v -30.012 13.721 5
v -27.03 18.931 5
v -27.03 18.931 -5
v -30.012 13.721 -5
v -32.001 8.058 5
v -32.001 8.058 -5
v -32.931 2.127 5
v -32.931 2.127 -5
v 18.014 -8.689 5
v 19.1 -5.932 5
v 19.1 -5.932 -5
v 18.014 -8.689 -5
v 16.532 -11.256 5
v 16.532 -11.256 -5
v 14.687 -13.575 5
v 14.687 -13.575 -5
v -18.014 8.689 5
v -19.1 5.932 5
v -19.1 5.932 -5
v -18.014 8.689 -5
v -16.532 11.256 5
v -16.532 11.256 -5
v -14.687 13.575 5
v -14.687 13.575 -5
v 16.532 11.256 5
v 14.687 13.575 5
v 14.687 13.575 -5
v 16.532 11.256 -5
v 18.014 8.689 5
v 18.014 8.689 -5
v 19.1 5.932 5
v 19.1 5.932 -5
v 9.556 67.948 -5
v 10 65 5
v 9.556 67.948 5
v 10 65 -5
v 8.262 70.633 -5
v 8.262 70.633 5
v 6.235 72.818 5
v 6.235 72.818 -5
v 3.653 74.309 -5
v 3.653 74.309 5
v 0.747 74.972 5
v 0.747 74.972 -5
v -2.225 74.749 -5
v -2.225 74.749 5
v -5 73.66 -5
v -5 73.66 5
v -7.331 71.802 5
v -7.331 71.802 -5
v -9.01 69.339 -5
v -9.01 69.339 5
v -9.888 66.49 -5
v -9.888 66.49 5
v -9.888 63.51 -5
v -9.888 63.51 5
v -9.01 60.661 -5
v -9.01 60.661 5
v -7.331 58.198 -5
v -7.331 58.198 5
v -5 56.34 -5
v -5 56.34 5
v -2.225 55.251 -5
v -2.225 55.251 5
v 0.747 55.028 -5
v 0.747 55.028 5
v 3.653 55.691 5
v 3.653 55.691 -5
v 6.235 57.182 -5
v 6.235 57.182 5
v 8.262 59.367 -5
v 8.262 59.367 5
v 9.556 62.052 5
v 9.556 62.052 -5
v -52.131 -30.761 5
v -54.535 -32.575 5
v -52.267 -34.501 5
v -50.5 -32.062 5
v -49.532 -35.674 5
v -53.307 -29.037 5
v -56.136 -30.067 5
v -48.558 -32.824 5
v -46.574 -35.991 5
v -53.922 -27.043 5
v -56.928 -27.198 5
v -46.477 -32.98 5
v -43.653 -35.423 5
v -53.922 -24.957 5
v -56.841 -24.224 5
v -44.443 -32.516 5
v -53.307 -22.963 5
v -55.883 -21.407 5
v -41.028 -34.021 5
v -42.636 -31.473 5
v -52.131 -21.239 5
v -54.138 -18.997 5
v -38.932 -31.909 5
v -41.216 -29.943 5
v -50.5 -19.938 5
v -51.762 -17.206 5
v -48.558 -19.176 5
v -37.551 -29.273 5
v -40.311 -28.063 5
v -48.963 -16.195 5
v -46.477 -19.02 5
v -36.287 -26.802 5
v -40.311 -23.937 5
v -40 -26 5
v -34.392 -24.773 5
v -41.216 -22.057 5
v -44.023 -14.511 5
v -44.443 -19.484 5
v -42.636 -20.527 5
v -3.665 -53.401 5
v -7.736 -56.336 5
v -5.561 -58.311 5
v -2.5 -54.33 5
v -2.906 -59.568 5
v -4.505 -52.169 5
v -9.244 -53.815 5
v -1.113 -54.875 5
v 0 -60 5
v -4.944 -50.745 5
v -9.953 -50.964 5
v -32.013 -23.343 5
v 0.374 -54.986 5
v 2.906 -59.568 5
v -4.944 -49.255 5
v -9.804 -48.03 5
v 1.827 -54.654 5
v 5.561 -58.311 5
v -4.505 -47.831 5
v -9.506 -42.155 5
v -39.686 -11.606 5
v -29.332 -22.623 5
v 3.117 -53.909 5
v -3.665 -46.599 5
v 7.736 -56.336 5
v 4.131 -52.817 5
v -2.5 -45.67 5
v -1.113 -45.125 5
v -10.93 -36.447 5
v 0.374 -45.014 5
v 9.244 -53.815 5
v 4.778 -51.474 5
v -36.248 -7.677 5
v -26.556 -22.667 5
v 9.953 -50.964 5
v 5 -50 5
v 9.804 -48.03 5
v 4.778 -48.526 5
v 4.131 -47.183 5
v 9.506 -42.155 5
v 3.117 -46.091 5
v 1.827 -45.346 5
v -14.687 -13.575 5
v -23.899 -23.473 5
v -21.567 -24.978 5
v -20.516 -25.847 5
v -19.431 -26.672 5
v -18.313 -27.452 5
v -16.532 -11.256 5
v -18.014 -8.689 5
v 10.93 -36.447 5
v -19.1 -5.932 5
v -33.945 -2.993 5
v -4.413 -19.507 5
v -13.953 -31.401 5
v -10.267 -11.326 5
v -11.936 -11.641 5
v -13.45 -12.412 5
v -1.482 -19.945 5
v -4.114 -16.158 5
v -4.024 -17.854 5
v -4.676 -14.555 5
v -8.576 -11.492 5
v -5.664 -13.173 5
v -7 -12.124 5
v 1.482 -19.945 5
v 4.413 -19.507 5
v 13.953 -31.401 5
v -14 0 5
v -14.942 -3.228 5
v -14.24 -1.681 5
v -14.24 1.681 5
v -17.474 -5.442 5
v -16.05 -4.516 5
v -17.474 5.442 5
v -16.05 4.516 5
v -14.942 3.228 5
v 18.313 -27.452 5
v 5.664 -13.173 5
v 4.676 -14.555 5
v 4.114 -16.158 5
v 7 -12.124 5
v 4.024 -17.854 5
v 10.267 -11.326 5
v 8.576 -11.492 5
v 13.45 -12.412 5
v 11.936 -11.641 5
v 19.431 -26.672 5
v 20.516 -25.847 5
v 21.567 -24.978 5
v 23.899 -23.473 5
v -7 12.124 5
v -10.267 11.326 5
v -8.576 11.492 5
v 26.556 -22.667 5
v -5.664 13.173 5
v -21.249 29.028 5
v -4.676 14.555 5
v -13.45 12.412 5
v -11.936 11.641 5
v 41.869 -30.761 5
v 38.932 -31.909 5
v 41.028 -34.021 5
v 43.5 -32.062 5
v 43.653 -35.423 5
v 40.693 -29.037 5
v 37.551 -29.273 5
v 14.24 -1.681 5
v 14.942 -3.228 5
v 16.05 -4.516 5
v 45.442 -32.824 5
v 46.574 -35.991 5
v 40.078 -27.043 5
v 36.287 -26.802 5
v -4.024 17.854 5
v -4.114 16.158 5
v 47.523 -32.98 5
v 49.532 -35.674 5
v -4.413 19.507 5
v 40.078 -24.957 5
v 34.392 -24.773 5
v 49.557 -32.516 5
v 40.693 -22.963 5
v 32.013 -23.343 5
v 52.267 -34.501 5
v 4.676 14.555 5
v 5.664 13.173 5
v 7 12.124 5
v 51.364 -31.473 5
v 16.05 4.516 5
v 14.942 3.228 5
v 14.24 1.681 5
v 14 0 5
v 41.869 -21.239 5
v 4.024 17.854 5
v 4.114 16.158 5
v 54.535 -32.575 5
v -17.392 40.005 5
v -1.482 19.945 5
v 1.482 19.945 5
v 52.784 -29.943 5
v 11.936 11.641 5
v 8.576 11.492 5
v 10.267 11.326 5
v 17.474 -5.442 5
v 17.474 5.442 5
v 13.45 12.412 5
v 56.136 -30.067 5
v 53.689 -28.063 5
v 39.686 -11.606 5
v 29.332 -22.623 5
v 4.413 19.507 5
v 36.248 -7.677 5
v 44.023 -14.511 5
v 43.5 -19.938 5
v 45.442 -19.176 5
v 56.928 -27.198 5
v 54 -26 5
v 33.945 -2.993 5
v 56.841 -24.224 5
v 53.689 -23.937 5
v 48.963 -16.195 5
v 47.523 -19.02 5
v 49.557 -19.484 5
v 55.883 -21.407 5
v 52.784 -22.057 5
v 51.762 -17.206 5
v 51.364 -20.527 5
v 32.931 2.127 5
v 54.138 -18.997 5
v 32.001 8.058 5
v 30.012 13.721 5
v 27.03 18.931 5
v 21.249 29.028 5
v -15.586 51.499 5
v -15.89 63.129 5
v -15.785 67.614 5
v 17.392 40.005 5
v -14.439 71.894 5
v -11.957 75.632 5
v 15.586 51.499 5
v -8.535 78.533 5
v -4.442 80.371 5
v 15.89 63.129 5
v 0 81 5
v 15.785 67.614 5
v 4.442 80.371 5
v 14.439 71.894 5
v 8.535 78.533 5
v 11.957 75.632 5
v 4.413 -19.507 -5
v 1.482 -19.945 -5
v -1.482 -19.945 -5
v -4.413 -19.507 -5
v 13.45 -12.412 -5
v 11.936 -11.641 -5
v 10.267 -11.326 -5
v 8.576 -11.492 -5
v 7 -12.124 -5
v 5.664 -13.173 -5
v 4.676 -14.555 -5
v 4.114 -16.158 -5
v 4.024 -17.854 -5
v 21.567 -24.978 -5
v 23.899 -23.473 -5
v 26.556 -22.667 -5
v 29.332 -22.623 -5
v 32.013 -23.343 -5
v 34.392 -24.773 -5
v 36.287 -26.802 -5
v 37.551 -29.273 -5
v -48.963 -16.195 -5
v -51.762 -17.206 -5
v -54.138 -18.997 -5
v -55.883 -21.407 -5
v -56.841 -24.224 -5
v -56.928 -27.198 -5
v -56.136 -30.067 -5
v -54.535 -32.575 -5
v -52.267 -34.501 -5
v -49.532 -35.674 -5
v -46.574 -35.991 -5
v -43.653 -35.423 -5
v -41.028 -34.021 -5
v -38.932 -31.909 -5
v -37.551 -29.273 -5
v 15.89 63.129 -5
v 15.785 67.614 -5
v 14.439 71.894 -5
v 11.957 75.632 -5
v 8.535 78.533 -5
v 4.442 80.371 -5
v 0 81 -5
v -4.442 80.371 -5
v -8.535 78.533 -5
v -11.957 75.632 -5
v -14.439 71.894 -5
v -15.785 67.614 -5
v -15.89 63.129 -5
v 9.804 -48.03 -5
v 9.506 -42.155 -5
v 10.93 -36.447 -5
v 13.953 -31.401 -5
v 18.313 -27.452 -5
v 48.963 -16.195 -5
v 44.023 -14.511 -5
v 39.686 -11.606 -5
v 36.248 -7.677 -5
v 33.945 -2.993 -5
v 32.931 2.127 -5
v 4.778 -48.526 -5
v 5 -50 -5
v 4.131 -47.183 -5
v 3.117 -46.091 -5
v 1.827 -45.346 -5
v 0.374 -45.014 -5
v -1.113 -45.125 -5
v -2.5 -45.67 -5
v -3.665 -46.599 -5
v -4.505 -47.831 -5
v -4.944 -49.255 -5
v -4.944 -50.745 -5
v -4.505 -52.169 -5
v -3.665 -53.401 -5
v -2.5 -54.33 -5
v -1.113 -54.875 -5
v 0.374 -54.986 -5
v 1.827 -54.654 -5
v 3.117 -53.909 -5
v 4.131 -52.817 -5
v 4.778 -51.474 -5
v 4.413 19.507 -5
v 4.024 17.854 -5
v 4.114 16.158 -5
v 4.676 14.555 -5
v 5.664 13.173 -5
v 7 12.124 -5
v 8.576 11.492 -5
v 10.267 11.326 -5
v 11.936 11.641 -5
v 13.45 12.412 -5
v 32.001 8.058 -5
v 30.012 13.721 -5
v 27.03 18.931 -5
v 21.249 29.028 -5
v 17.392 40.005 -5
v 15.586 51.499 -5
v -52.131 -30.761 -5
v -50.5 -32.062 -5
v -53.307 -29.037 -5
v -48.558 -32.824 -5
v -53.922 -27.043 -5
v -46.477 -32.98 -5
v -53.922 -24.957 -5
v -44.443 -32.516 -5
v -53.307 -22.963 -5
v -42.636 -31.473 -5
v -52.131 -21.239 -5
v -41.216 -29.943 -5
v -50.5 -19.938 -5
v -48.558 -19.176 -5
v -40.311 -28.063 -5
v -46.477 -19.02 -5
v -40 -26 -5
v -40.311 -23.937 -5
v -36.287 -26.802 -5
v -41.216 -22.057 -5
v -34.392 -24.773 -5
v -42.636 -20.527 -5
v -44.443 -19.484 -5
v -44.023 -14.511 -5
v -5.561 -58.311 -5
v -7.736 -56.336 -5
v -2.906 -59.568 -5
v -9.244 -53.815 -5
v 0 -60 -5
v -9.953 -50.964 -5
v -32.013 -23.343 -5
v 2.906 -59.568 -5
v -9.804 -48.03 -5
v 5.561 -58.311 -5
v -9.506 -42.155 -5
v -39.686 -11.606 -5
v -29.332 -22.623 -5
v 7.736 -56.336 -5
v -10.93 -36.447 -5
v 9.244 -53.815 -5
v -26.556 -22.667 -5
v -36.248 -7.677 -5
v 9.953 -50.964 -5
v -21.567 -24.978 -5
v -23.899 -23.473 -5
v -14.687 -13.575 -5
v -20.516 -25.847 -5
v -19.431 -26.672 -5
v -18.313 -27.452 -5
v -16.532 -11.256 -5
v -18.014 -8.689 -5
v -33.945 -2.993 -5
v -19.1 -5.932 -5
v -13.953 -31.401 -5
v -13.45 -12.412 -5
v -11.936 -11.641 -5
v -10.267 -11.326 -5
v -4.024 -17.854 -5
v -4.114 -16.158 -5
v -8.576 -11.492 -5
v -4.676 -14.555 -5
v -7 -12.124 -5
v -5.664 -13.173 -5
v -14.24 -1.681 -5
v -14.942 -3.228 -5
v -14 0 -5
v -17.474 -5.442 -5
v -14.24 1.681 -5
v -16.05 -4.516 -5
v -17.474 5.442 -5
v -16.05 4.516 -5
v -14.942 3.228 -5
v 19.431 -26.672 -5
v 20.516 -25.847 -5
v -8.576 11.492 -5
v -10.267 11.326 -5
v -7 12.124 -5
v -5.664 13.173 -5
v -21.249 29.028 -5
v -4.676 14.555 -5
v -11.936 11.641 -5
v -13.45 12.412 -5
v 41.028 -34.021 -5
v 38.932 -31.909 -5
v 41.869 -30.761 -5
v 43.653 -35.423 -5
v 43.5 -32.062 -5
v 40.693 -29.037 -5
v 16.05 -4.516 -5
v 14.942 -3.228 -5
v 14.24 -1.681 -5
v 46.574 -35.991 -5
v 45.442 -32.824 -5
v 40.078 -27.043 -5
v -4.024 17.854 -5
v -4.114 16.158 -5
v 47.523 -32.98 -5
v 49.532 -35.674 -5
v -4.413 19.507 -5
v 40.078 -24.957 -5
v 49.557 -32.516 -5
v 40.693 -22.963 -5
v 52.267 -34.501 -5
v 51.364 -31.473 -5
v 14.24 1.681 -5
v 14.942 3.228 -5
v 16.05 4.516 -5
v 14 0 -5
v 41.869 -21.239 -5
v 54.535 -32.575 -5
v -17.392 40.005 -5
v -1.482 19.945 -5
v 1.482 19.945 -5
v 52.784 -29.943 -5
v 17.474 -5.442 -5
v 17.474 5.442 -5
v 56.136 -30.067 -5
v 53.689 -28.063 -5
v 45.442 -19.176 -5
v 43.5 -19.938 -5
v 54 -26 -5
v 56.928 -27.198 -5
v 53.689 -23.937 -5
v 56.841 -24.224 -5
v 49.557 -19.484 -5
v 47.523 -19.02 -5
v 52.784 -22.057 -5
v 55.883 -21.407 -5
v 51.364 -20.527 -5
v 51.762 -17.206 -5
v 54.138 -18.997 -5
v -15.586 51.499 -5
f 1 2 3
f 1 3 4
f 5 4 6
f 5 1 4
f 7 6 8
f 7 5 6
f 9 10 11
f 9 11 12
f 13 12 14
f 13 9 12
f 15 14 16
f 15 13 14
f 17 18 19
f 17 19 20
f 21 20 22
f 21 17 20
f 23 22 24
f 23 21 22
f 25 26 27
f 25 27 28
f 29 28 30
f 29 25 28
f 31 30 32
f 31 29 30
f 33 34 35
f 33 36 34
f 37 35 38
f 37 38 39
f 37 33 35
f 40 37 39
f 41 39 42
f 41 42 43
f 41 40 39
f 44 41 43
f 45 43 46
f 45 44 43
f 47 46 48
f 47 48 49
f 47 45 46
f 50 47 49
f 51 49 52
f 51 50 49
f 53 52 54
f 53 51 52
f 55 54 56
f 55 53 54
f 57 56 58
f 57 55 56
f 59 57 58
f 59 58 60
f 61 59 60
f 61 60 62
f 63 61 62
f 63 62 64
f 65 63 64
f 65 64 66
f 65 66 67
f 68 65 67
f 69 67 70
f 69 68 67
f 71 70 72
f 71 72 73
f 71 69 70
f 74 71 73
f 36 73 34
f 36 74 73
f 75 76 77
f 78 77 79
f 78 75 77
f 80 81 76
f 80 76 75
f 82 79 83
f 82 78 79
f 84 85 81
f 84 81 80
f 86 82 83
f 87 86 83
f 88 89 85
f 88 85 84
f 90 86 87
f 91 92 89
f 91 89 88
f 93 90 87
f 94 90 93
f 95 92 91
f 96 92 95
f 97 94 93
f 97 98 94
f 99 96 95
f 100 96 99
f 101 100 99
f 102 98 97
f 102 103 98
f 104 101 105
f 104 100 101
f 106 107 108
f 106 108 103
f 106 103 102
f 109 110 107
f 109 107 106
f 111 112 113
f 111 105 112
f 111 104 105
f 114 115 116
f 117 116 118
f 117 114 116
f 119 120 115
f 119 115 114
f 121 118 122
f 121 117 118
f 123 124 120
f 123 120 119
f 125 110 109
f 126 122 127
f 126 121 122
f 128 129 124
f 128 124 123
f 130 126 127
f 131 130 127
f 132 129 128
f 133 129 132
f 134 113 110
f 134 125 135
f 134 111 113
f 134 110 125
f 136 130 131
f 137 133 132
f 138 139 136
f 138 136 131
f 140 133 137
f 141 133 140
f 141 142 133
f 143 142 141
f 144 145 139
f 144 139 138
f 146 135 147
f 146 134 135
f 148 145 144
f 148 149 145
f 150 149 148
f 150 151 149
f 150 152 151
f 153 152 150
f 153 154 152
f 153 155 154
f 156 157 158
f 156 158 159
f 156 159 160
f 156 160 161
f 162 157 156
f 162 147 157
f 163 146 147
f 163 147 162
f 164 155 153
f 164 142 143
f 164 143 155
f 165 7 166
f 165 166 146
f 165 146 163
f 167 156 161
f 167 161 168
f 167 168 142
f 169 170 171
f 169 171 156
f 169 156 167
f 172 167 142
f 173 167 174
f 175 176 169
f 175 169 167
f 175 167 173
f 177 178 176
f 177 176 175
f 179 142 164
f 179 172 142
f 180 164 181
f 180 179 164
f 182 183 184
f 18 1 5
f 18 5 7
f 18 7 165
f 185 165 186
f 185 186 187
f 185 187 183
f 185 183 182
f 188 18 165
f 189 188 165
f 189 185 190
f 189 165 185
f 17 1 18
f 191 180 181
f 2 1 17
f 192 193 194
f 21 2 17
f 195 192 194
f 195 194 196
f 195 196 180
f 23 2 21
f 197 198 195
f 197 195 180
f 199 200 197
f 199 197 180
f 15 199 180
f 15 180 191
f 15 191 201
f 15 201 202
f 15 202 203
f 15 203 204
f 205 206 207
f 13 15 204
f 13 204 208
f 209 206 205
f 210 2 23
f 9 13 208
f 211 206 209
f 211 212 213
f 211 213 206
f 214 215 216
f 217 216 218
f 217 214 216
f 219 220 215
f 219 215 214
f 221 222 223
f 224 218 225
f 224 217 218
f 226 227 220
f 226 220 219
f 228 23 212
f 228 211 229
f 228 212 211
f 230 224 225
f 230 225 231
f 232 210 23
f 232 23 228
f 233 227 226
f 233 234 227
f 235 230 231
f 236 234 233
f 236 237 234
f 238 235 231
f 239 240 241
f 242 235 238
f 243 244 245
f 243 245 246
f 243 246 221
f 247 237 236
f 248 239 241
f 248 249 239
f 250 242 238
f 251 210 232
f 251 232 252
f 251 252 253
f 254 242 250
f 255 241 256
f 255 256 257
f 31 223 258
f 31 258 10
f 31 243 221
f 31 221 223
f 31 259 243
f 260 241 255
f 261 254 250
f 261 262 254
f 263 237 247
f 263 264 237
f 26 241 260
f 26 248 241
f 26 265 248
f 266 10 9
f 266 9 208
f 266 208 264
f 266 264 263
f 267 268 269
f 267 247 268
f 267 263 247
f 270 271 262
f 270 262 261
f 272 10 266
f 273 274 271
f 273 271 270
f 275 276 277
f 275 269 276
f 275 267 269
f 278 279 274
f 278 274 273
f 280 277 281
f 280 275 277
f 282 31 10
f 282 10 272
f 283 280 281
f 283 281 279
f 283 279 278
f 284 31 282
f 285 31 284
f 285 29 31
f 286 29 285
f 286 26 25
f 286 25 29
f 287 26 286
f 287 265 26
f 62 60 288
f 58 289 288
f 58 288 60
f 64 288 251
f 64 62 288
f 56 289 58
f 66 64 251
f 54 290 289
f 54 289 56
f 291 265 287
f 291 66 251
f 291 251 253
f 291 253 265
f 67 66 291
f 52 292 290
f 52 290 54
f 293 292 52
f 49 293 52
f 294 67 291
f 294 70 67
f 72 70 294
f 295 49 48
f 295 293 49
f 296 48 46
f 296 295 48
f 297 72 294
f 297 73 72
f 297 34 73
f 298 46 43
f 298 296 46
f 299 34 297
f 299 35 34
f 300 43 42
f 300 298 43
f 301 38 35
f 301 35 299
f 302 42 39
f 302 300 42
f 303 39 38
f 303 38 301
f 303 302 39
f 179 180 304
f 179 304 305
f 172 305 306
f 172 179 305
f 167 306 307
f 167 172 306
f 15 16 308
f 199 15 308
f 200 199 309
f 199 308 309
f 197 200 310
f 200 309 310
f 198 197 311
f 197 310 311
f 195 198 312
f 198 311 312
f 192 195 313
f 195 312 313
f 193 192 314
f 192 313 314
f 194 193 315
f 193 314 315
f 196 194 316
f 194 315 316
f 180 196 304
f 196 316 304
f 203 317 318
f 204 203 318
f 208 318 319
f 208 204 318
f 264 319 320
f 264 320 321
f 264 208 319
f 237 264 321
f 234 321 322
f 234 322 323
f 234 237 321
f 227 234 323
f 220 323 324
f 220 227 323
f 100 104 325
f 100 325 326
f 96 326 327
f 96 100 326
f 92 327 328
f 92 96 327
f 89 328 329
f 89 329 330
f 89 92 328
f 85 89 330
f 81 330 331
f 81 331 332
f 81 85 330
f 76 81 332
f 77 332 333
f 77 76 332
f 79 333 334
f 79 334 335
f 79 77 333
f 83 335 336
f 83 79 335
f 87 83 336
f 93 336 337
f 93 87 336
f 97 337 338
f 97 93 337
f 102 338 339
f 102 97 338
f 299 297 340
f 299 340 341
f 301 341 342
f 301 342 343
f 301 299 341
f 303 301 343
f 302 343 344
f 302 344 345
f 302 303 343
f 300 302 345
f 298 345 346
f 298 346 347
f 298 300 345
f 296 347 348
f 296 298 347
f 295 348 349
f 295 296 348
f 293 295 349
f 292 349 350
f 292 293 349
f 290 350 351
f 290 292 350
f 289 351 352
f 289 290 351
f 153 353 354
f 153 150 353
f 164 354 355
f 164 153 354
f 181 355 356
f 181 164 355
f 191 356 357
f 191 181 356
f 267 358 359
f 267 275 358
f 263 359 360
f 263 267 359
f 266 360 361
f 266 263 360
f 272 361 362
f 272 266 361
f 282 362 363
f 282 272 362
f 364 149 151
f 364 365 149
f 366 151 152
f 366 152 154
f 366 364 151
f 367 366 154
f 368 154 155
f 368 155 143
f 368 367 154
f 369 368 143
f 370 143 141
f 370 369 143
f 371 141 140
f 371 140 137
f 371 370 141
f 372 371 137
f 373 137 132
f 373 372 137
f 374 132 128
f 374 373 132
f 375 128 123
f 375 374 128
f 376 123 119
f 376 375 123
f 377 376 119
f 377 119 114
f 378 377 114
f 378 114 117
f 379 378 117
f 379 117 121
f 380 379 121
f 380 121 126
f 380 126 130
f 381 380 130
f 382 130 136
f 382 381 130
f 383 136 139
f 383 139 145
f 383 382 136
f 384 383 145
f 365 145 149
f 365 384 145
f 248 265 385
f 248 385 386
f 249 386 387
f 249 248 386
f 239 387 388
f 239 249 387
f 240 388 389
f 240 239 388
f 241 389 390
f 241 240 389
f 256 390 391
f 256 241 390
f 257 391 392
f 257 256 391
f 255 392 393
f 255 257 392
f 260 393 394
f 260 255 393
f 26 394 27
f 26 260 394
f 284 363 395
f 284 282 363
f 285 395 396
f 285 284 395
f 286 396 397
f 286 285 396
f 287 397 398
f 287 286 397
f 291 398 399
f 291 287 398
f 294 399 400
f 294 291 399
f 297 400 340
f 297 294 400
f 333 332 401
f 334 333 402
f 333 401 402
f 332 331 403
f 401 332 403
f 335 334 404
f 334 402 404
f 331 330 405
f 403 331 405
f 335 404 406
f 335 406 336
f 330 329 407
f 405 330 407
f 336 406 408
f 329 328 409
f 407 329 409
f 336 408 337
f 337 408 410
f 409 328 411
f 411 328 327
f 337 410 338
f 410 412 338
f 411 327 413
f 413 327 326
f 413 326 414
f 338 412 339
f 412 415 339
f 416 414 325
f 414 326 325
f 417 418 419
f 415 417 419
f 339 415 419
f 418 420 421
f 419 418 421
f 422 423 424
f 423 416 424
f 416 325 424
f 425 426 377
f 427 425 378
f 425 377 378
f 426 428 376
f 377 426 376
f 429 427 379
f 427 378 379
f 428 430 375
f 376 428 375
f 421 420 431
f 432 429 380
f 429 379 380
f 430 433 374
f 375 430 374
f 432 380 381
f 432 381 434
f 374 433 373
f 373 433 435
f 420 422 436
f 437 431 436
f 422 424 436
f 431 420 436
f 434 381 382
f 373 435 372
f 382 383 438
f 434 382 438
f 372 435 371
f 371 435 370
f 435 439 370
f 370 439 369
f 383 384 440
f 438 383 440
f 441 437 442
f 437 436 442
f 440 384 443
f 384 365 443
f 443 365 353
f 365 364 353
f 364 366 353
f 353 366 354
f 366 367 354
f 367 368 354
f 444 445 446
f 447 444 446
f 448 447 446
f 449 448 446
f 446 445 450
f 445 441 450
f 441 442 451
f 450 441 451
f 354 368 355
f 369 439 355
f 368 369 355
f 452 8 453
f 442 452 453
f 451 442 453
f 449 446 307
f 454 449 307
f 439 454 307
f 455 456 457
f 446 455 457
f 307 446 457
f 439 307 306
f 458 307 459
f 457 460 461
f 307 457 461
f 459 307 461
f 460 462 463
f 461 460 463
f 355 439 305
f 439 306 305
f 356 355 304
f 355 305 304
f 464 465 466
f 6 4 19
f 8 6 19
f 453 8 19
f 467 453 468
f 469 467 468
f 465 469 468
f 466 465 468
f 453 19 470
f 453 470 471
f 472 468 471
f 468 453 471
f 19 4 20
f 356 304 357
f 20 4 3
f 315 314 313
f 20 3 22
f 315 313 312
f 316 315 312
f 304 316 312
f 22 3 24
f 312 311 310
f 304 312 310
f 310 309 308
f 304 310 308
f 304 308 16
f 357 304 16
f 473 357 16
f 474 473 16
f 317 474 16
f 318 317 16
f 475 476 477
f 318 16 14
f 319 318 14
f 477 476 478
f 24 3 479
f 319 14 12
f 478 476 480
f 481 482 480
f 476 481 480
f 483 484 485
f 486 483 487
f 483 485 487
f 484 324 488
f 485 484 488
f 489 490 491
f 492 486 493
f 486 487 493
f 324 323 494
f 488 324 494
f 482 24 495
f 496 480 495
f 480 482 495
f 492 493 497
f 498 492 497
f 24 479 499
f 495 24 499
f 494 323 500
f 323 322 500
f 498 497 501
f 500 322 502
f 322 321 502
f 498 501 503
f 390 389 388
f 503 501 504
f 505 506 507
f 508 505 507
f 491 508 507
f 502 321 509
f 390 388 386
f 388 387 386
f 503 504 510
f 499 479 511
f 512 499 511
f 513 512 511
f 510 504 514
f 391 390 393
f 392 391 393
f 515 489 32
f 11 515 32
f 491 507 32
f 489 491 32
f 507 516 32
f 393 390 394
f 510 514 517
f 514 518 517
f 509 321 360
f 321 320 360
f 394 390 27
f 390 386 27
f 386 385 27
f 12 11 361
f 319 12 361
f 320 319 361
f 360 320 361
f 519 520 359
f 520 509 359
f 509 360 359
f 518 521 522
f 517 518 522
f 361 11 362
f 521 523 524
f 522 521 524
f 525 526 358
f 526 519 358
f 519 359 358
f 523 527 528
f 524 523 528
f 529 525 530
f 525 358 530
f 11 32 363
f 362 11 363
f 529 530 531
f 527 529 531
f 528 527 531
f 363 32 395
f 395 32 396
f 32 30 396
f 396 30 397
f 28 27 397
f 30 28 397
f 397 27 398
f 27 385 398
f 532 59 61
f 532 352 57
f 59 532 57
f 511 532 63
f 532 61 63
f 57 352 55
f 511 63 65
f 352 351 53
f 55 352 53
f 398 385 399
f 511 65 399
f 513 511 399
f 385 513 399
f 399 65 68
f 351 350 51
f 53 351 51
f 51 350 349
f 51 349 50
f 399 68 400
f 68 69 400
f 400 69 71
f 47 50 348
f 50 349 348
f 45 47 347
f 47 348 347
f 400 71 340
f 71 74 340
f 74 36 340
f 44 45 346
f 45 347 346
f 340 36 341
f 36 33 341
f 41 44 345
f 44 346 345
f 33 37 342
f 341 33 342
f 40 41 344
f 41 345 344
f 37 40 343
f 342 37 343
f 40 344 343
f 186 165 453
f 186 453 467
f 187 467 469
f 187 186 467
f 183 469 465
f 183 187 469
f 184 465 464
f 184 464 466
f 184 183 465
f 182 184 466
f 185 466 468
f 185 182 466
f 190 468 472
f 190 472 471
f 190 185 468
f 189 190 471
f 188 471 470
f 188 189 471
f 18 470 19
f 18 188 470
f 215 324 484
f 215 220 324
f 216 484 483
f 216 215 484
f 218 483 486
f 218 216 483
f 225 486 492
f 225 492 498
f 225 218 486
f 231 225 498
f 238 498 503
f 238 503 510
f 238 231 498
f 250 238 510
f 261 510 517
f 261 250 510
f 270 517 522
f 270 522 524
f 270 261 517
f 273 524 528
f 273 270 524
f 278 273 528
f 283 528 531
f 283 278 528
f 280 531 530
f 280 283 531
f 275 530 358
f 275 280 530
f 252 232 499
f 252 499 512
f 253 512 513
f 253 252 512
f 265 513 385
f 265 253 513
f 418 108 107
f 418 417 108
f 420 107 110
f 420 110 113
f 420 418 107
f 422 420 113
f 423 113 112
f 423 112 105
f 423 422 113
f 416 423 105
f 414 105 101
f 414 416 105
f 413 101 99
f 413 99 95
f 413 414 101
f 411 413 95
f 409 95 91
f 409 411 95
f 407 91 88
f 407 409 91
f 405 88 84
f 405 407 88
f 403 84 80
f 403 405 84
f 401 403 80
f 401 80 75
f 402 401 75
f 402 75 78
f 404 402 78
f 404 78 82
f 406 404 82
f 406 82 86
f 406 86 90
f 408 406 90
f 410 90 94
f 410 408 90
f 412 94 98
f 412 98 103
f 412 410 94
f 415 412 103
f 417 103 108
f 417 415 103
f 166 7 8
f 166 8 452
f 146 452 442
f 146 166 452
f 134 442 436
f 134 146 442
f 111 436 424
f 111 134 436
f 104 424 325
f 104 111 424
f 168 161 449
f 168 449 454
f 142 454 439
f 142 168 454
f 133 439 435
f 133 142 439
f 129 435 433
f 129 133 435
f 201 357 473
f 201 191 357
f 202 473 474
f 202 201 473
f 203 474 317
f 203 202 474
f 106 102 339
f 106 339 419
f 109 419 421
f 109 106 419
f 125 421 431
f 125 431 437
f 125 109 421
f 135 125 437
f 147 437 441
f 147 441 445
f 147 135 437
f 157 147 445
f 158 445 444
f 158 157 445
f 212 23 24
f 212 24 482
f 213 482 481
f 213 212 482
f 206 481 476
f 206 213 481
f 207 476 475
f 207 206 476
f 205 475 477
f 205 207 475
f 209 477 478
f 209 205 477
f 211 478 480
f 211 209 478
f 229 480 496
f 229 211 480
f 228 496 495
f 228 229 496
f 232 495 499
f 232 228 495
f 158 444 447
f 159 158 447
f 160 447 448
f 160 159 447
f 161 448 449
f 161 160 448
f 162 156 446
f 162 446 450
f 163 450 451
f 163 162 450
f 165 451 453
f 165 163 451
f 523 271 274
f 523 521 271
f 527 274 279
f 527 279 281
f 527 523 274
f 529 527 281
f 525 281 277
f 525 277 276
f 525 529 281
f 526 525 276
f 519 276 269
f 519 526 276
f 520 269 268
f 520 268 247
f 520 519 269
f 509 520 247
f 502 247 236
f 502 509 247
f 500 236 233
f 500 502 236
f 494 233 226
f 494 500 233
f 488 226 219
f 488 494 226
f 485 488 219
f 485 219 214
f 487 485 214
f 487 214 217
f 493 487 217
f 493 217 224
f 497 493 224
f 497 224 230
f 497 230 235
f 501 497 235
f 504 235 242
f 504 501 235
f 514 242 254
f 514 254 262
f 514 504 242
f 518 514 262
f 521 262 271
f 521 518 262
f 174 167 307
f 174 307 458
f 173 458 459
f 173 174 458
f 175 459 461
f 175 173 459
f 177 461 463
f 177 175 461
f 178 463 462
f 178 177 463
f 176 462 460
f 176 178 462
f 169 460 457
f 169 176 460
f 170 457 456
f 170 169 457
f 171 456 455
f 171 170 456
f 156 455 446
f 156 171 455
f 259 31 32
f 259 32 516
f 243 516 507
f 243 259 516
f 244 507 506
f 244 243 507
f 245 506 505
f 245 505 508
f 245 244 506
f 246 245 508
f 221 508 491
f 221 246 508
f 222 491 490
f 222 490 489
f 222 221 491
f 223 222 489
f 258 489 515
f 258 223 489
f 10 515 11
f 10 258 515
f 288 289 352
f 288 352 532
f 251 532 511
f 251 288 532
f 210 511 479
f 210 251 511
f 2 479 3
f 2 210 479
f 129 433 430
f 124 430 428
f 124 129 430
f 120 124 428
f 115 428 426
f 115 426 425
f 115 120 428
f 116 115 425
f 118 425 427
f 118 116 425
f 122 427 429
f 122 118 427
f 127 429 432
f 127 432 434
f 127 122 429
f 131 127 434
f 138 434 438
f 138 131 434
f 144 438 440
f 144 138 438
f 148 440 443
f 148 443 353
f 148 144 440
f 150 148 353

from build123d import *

# Parameters (mm, degrees)
SKETCH1_R           = 7
SKETCH1_R_2         = 5
SKETCH1_R_3         = 10
BOSS_EXTRUDE1_DEPTH = 5


with BuildPart() as part:
    # Sketch1 → Boss-Extrude1 (new, symmetric)
    with BuildSketch(Plane.XY):
        with BuildLine():
            ThreePointArc((27.029816197, 18.931165741), (17.392020832, 40.004906757), (15.890255583, 63.129230769))
            ThreePointArc((15.890255583, 63.129230769), (0, 81), (-15.890255583, 63.129230769))
            ThreePointArc((-15.890255583, 63.129230769), (-17.392020832, 40.004906757), (-27.029816197, 18.931165741))
            ThreePointArc((-27.029816197, 18.931165741), (-31.135684701, 10.934767406), (-32.931378534, 2.127042038))
            ThreePointArc((-32.931378534, 2.127042038), (-37.838433301, -9.754136505), (-48.963263256, -16.194613858))
            ThreePointArc((-48.963263256, -16.194613858), (-54.534765397, -32.574747935), (-37.550915036, -29.273345896))
            ThreePointArc((-37.550915036, -29.273345896), (-30.697148757, -22.889346352), (-21.566520754, -24.9776937))
            ThreePointArc((-21.566520754, -24.9776937), (-19.978209416, -26.265398313), (-18.313197236, -27.452264151))
            ThreePointArc((-18.313197236, -27.452264151), (-10.929939867, -36.447383635), (-9.804034884, -48.03))
            ThreePointArc((-9.804034884, -48.03), (0, -60), (9.804034884, -48.03))
            ThreePointArc((9.804034884, -48.03), (10.929939867, -36.447383635), (18.313197236, -27.452264151))
            ThreePointArc((18.313197236, -27.452264151), (19.978209416, -26.265398313), (21.566520754, -24.9776937))
            ThreePointArc((21.566520754, -24.9776937), (30.697148757, -22.889346352), (37.550915036, -29.273345896))
            ThreePointArc((37.550915036, -29.273345896), (54.534765397, -32.574747935), (48.963263256, -16.194613858))
            ThreePointArc((48.963263256, -16.194613858), (37.838433301, -9.754136505), (32.931378534, 2.127042038))
            ThreePointArc((32.931378534, 2.127042038), (31.135684701, 10.934767406), (27.029816197, 18.931165741))
        make_face()
        with Locations((-47, -26)):
            Circle(SKETCH1_R, mode=Mode.SUBTRACT)
        with BuildLine():
            ThreePointArc((-4.412636863, 19.507143202), (0, 20), (4.412636863, 19.507143202))
            ThreePointArc((4.412636863, 19.507143202), (7, 12.124355653), (14.687363137, 13.575027222))
            ThreePointArc((14.687363137, 13.575027222), (17.320508076, 10), (19.1, 5.93211598))
            ThreePointArc((19.1, 5.93211598), (14, 0), (19.1, -5.93211598))
            ThreePointArc((19.1, -5.93211598), (17.320508076, -10), (14.687363137, -13.575027222))
            ThreePointArc((14.687363137, -13.575027222), (7, -12.124355653), (4.412636863, -19.507143202))
            ThreePointArc((4.412636863, -19.507143202), (0, -20), (-4.412636863, -19.507143202))
            ThreePointArc((-4.412636863, -19.507143202), (-7, -12.124355653), (-14.687363137, -13.575027222))
            ThreePointArc((-14.687363137, -13.575027222), (-17.320508076, -10), (-19.1, -5.93211598))
            ThreePointArc((-19.1, -5.93211598), (-14, 0), (-19.1, 5.93211598))
            ThreePointArc((-19.1, 5.93211598), (-17.320508076, 10), (-14.687363137, 13.575027222))
            ThreePointArc((-14.687363137, 13.575027222), (-7, 12.124355653), (-4.412636863, 19.507143202))
        make_face(mode=Mode.SUBTRACT)
        with Locations((0, -50)):
            Circle(SKETCH1_R_2, mode=Mode.SUBTRACT)
        with Locations((47, -26)):
            Circle(SKETCH1_R, mode=Mode.SUBTRACT)
        with Locations((0, 65)):
            Circle(SKETCH1_R_3, mode=Mode.SUBTRACT)
    extrude(amount=BOSS_EXTRUDE1_DEPTH, both=True)


solid = part.part
